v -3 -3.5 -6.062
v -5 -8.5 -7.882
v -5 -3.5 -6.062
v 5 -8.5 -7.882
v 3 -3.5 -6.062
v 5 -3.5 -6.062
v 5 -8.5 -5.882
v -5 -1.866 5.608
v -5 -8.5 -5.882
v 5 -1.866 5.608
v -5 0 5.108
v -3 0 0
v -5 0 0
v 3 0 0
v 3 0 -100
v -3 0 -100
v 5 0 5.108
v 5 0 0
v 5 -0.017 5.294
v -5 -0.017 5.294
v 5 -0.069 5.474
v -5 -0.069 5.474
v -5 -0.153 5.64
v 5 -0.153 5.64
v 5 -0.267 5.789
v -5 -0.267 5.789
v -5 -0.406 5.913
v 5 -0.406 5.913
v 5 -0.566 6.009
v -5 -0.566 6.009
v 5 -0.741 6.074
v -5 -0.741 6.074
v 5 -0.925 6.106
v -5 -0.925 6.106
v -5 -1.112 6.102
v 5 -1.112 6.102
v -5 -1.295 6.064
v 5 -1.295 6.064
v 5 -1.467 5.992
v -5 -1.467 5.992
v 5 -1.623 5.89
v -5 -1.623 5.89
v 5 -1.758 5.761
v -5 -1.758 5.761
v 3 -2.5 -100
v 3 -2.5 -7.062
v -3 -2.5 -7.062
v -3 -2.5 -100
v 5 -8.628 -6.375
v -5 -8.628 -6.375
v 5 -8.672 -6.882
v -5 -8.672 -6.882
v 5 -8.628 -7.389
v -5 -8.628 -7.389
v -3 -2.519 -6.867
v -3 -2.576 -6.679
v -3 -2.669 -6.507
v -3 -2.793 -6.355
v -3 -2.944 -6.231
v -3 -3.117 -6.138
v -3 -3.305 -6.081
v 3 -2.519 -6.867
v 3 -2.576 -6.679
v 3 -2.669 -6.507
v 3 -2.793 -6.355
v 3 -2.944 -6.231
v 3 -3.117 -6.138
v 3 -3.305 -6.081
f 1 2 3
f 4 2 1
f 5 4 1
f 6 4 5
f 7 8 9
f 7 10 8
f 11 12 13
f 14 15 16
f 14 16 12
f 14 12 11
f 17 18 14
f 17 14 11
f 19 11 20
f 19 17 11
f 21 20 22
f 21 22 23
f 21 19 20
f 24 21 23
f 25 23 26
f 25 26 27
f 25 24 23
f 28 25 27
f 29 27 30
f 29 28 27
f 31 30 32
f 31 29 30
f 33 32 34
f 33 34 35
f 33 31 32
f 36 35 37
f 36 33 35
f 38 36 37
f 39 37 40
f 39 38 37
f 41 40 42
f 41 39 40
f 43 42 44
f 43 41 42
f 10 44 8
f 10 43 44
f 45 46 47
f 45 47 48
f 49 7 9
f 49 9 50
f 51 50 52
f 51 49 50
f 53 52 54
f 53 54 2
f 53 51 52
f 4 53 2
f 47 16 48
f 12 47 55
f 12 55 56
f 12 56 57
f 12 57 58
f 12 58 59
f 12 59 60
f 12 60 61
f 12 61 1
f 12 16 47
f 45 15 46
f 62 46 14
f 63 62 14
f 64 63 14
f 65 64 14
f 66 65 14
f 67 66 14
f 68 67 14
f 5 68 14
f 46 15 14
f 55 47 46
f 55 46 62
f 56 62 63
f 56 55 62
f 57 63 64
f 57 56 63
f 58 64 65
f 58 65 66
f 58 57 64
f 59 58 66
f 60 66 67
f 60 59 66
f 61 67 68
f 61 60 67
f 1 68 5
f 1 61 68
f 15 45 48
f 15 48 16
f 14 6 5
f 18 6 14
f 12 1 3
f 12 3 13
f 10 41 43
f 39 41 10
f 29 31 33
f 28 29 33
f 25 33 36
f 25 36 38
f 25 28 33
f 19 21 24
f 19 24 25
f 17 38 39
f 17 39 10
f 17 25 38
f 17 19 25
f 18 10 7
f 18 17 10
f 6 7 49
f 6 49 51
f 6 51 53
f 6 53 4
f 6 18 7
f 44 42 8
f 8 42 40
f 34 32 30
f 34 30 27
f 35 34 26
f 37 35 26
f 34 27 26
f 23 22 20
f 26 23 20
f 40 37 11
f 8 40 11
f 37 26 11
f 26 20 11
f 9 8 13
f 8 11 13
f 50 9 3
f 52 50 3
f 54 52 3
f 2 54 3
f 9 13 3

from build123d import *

# Parameters (mm, degrees)
SKETCH1_W           = 100
SKETCH1_H           = 2.5
BOSS_EXTRUDE1_DEPTH = 3
BOSS_EXTRUDE2_DEPTH = 5
FILLET4_R           = 1
FILLET2_R           = 1


with BuildPart() as part:
    # Sketch1 → Boss-Extrude1 (new, symmetric)
    with BuildSketch(Plane(origin=(0, 0, 0), x_dir=(0, 0, -1), z_dir=(1, 0, 0))):
        with Locations((50, -1.25)):
            Rectangle(SKETCH1_W, SKETCH1_H)
    extrude(amount=BOSS_EXTRUDE1_DEPTH, both=True)

    # Sketch2 → Boss-Extrude2 (add, symmetric)
    with BuildSketch(Plane(origin=(0, 0, 0), x_dir=(0, 0, -1), z_dir=(1, 0, 0))):
        with BuildLine():
            Line((0, 0), (-8.840402867, 0))
            Line((-8.840402867, 0), (5.882028998, -8.5))
            ThreePointArc((5.882028998, -8.5), (6.882028998, -8.671572875), (7.882028998, -8.5))
            Line((7.882028998, -8.5), (6.062177826, -3.5))
            Line((6.062177826, -3.5), (0, 0))
        make_face()
    extrude(amount=BOSS_EXTRUDE2_DEPTH, both=True)

    # Fillet4
    # the kernel refuses this fillet: 1 mm, written as the material it adds along each edge
    with BuildSketch(Plane(origin=(-3, -2.5, -4.330127019), x_dir=(0, 0, -1), z_dir=(1, 0, 0))) as fillet4_piece_1:
        with BuildLine():
            CenterArc((2.732050808, -1), FILLET4_R, 90, 90)
            Line((1.732050808, -1), (1.712050808, -1))
            ThreePointArc((1.712050808, -1), (0.856025404, -0.517320508), (-0.01, -0.017320508))
            Line((-0.01, -0.017320508), (0, 0.02))
            Line((0, 0.02), (2.732050808, 0.02))
            Line((2.732050808, 0.02), (2.732050808, 0))
        make_face()
    extrude(amount=6)

    # Fillet2
    fillet2_edges = [part.edges().sort_by_distance(p)[0] for p in [
        (0, 0, 8.840402867),
    ]]
    fillet(fillet2_edges, radius=FILLET2_R)


solid = part.part
